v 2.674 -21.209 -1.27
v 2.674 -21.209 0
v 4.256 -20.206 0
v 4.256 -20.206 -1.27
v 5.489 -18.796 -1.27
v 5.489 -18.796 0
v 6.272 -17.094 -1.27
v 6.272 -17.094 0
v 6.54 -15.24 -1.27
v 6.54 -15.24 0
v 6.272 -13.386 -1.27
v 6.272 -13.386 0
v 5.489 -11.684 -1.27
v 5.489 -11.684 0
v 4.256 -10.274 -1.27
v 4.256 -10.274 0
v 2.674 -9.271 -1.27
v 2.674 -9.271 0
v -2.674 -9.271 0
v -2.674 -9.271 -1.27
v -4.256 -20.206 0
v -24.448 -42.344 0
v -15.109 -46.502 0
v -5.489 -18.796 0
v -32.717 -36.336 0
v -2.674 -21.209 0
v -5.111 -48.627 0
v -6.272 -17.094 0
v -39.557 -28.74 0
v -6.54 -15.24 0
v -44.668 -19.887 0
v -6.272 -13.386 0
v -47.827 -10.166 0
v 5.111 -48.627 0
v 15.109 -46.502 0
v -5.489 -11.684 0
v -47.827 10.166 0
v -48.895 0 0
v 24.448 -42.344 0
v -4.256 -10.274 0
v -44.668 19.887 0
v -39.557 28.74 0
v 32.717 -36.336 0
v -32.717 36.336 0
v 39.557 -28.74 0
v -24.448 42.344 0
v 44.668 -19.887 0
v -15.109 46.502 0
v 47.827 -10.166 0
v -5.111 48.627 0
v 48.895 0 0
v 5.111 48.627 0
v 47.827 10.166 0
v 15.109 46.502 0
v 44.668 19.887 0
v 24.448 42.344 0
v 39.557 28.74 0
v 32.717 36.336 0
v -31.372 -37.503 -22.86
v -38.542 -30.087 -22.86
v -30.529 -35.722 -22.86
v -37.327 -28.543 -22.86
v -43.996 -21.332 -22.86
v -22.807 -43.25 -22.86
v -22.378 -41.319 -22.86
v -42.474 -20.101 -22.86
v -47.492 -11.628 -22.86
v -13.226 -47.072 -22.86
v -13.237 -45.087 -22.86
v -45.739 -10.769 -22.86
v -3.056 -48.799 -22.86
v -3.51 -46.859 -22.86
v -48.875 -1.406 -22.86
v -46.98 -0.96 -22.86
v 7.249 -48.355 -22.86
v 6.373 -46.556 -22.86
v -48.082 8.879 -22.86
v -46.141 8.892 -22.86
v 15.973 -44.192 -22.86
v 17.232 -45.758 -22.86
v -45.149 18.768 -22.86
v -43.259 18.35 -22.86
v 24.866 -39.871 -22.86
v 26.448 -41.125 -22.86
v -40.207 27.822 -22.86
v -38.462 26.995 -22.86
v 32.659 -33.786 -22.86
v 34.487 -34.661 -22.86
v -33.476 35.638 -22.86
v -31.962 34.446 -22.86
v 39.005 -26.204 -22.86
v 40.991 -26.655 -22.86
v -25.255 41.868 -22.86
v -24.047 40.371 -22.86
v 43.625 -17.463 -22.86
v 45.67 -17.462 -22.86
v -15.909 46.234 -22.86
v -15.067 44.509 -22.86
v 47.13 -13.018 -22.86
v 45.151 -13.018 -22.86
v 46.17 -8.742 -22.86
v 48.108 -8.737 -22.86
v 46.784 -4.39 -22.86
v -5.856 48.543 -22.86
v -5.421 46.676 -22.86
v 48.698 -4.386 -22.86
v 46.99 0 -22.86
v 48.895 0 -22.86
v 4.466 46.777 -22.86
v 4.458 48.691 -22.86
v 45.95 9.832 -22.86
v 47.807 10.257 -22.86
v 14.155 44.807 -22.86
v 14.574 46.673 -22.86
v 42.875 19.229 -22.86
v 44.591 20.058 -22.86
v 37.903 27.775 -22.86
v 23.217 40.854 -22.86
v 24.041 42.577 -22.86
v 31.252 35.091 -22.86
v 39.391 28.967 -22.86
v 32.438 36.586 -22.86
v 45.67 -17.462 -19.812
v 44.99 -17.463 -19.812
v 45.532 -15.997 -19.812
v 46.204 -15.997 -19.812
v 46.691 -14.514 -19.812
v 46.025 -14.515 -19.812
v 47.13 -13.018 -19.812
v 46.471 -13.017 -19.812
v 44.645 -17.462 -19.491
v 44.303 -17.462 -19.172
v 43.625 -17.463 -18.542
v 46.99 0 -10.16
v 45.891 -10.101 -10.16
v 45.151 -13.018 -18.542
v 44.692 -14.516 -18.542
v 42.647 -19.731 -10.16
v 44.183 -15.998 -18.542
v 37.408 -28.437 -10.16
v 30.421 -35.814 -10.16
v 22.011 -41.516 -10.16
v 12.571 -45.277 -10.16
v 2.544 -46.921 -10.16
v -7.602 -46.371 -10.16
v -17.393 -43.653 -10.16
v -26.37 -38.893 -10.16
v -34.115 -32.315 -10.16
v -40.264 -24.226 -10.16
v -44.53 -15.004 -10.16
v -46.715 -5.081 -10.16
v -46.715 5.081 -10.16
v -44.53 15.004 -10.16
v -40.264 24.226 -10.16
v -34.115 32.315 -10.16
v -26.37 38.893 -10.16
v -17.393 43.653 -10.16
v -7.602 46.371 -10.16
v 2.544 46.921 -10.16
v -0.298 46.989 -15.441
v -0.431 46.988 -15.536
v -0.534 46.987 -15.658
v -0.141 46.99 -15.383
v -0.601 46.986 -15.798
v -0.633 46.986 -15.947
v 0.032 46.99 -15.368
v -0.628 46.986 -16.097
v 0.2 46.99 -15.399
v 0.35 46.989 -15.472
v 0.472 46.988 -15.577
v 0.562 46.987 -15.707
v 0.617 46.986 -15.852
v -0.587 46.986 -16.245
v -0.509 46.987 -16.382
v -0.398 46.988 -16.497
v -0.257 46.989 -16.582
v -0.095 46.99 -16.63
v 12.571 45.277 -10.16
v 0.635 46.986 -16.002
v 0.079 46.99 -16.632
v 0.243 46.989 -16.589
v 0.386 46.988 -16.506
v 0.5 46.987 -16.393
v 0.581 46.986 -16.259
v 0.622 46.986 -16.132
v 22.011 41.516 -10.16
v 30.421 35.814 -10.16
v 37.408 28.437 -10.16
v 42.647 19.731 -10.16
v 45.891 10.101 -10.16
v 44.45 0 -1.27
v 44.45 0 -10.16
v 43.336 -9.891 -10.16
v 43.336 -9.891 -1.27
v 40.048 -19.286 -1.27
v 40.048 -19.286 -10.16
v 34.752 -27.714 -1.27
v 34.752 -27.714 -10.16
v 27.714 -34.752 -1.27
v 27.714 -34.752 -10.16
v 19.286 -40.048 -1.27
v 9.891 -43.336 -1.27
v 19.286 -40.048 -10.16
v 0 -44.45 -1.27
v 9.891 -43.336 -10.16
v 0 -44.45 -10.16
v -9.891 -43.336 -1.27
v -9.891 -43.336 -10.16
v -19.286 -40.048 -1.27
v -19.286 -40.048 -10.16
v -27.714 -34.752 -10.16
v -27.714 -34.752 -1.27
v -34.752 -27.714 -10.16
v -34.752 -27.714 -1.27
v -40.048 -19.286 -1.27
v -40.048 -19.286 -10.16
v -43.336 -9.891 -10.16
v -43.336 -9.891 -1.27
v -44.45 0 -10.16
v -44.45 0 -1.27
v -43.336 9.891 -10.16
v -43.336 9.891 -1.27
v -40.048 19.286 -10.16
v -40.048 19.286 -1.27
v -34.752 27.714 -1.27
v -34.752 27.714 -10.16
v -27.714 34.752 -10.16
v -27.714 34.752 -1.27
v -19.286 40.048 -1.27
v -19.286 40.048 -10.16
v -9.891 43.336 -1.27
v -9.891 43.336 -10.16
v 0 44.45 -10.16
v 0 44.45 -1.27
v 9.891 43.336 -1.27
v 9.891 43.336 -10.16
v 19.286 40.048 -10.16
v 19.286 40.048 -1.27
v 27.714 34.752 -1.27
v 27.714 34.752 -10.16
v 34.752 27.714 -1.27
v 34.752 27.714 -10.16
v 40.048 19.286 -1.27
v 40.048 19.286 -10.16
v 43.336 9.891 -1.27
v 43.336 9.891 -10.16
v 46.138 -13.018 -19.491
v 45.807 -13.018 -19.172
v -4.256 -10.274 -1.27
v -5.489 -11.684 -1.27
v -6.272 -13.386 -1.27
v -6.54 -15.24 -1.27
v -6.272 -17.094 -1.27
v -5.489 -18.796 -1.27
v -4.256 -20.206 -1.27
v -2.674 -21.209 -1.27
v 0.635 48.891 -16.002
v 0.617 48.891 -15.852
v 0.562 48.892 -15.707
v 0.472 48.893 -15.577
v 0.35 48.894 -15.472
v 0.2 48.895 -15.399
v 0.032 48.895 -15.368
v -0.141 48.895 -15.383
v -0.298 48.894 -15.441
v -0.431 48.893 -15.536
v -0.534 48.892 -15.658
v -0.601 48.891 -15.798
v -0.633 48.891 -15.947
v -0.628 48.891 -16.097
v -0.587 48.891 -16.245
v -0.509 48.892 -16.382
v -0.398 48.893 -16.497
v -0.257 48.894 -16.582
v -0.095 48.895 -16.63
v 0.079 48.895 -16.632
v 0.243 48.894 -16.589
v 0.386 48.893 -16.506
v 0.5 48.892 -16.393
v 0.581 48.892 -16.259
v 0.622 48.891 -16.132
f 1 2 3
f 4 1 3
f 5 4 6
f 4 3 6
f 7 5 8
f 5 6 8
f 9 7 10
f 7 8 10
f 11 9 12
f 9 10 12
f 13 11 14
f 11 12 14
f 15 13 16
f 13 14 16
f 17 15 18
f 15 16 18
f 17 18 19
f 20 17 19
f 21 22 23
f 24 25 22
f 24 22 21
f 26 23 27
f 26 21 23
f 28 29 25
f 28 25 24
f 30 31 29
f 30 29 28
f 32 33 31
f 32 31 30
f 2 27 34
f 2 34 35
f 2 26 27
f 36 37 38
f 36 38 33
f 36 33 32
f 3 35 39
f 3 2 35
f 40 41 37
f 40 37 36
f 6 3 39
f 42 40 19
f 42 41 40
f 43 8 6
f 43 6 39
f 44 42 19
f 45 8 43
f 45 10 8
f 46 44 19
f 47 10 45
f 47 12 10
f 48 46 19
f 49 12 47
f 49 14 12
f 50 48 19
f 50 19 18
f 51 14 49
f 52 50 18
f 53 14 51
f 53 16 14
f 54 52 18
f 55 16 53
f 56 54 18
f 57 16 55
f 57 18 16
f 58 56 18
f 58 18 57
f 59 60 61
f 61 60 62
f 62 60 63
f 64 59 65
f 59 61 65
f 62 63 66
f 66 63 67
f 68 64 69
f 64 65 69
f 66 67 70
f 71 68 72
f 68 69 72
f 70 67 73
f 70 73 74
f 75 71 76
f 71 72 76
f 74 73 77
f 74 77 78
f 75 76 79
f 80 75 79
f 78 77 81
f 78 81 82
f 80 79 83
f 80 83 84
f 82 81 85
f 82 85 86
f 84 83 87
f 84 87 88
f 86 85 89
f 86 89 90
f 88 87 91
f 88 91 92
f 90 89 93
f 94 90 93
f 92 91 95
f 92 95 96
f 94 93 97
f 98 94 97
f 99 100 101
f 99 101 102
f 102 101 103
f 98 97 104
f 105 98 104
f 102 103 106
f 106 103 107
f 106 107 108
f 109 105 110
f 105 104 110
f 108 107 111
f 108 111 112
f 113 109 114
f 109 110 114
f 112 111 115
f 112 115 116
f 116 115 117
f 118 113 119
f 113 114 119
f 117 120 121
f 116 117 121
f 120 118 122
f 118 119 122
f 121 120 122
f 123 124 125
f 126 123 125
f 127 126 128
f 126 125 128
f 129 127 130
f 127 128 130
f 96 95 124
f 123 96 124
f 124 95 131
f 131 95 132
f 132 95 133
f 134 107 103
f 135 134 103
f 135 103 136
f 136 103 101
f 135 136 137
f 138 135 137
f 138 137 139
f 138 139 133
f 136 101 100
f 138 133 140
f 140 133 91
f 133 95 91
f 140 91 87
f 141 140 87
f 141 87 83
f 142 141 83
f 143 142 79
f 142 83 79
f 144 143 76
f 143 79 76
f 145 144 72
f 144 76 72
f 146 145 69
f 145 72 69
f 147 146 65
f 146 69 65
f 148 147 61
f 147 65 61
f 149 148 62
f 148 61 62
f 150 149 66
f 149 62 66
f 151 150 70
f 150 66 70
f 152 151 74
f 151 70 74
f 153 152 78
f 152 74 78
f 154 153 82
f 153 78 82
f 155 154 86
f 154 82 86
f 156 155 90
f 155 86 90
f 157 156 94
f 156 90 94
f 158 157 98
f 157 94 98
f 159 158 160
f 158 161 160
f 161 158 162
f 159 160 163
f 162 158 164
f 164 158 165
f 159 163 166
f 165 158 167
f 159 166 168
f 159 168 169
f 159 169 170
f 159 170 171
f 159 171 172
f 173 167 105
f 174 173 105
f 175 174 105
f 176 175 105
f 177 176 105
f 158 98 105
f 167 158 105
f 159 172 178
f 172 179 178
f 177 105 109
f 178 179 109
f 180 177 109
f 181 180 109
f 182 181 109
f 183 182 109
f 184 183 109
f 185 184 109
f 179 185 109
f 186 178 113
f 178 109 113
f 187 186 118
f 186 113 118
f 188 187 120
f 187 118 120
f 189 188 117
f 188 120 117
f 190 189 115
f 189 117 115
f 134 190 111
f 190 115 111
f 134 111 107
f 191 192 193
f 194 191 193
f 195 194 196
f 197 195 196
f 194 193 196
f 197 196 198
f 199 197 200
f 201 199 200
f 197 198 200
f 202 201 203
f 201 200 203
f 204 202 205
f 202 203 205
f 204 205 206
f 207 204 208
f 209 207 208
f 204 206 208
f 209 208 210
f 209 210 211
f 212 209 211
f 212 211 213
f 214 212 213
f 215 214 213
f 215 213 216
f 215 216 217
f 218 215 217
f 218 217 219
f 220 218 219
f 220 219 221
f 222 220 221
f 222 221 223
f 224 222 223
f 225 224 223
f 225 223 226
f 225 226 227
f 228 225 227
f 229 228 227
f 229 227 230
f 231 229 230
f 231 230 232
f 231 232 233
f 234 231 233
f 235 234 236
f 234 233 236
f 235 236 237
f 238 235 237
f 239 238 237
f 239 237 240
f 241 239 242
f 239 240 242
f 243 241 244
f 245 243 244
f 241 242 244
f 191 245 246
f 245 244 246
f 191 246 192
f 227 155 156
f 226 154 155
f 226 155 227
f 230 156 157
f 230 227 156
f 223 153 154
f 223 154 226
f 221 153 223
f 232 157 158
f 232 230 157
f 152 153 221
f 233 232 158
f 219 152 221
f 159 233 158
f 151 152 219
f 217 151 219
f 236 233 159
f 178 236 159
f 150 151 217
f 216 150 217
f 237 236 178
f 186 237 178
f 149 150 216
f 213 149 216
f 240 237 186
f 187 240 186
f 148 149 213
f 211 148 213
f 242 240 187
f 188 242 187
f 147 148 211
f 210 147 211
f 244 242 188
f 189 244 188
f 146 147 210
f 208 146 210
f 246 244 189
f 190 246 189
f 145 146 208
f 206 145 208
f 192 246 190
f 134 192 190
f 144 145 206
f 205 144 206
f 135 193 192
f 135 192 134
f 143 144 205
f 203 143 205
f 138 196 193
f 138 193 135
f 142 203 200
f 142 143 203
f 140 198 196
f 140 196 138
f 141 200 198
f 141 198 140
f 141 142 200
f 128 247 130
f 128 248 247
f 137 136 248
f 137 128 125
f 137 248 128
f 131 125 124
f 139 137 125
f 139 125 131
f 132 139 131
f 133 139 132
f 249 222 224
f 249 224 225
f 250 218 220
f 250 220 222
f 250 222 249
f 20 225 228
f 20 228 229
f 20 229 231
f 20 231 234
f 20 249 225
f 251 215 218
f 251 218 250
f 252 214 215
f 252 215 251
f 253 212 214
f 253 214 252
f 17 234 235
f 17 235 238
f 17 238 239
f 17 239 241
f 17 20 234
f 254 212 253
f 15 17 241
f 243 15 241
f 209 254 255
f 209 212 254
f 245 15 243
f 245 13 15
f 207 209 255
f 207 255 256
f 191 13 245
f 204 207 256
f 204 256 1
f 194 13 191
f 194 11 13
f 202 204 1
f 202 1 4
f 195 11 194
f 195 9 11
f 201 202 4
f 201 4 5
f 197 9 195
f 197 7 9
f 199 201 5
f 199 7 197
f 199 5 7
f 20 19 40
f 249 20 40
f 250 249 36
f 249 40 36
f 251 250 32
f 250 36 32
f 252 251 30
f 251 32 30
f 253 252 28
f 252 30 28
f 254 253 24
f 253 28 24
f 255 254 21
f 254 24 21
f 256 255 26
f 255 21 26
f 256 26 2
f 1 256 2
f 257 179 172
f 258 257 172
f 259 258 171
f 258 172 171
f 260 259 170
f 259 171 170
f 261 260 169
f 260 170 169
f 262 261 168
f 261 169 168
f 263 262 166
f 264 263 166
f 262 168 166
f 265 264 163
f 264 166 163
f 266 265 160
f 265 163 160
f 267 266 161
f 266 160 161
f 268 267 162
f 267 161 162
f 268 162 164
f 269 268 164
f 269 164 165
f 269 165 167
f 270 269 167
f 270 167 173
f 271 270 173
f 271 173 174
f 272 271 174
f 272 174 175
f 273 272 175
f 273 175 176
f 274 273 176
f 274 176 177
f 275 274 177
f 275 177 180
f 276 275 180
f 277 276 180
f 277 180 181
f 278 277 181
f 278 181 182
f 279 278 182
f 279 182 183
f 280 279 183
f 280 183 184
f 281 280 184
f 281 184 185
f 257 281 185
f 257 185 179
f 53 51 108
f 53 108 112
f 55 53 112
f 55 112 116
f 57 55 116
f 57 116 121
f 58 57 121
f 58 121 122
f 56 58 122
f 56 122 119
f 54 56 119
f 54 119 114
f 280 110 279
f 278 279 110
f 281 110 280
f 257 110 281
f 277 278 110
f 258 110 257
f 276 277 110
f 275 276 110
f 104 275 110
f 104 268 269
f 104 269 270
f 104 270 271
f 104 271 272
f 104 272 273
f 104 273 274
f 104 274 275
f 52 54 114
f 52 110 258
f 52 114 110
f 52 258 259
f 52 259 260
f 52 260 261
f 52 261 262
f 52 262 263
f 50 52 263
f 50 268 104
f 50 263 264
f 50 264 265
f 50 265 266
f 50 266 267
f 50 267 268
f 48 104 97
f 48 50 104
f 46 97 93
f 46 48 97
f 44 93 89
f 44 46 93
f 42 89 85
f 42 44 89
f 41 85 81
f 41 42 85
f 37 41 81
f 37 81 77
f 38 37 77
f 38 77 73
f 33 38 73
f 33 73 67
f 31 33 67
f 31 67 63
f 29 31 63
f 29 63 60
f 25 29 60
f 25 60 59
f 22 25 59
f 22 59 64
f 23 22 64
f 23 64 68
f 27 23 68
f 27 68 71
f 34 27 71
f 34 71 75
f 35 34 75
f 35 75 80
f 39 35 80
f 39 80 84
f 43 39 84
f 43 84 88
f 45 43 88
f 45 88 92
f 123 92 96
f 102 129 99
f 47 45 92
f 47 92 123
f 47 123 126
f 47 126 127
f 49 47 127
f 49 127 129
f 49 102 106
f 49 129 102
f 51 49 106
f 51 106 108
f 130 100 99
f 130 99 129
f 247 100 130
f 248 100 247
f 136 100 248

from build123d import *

# Parameters (mm, degrees)
F0_R      = 48.895
F1_DEPTH  = 22.86
F3_DEPTH  = 22.861
F5_R      = 46.99
F6_DEPTH  = 12.7
F7_R      = 44.45
F8_DEPTH  = 21.59
F9_W      = 4.445
F9_H      = 3.048
F10_DEPTH = 48.896
F11_SIZE  = 1.27
F12_R     = 0.635
F13_DEPTH = 48.896


with BuildPart() as f1:
    # F0 (on Top) → F1 (new body)
    with BuildSketch(Plane.XY):
        Circle(F0_R)
    extrude(amount=-F1_DEPTH)

    # F2 (on Top) → F3 (cut, through all)
    with BuildSketch(Plane.XY):
        with BuildLine():
            Line((-2.6737949155, -21.209), (2.6737949155, -21.209))
            ThreePointArc((2.6737949155, -21.209), (6.5405, -15.24), (2.6737949155, -9.271))
            Line((2.6737949155, -9.271), (-2.6737949155, -9.271))
            ThreePointArc((-2.6737949155, -9.271), (-6.5405, -15.24), (-2.6737949155, -21.209))
        make_face()
    extrude(amount=-F3_DEPTH, mode=Mode.SUBTRACT)

    # F5 (on offset) → F6 (cut)
    with BuildSketch(Plane(origin=(0, 0, -22.86), x_dir=(1, 0, 0), z_dir=(0, 0, -1))):
        Circle(F5_R)
    extrude(amount=-F6_DEPTH, mode=Mode.SUBTRACT)

    # F7 (on offset) → F8 (cut)
    with BuildSketch(Plane(origin=(0, 0, -22.86), x_dir=(1, 0, 0), z_dir=(0, 0, -1))):
        Circle(F7_R)
    extrude(amount=-F8_DEPTH, mode=Mode.SUBTRACT)

    # F9 (on Right) → F10 (cut, through all)
    with BuildSketch(Plane.YZ):
        with Locations((-15.24, -21.336)):
            Rectangle(F9_W, F9_H)
    extrude(amount=F10_DEPTH, mode=Mode.SUBTRACT)

    # F11
    f11_edges = [f1.edges().sort_by_distance(p)[0] for p in [
        (44.44345, -15.259091, -19.812),
    ]]
    chamfer(f11_edges, length=F11_SIZE)

    # F12 (on Front) → F13 (cut, through all)
    with BuildSketch(Plane.XZ):
        with Locations((0, -16.002)):
            Circle(F12_R)
    extrude(amount=-F13_DEPTH, mode=Mode.SUBTRACT)


solid = f1.part
